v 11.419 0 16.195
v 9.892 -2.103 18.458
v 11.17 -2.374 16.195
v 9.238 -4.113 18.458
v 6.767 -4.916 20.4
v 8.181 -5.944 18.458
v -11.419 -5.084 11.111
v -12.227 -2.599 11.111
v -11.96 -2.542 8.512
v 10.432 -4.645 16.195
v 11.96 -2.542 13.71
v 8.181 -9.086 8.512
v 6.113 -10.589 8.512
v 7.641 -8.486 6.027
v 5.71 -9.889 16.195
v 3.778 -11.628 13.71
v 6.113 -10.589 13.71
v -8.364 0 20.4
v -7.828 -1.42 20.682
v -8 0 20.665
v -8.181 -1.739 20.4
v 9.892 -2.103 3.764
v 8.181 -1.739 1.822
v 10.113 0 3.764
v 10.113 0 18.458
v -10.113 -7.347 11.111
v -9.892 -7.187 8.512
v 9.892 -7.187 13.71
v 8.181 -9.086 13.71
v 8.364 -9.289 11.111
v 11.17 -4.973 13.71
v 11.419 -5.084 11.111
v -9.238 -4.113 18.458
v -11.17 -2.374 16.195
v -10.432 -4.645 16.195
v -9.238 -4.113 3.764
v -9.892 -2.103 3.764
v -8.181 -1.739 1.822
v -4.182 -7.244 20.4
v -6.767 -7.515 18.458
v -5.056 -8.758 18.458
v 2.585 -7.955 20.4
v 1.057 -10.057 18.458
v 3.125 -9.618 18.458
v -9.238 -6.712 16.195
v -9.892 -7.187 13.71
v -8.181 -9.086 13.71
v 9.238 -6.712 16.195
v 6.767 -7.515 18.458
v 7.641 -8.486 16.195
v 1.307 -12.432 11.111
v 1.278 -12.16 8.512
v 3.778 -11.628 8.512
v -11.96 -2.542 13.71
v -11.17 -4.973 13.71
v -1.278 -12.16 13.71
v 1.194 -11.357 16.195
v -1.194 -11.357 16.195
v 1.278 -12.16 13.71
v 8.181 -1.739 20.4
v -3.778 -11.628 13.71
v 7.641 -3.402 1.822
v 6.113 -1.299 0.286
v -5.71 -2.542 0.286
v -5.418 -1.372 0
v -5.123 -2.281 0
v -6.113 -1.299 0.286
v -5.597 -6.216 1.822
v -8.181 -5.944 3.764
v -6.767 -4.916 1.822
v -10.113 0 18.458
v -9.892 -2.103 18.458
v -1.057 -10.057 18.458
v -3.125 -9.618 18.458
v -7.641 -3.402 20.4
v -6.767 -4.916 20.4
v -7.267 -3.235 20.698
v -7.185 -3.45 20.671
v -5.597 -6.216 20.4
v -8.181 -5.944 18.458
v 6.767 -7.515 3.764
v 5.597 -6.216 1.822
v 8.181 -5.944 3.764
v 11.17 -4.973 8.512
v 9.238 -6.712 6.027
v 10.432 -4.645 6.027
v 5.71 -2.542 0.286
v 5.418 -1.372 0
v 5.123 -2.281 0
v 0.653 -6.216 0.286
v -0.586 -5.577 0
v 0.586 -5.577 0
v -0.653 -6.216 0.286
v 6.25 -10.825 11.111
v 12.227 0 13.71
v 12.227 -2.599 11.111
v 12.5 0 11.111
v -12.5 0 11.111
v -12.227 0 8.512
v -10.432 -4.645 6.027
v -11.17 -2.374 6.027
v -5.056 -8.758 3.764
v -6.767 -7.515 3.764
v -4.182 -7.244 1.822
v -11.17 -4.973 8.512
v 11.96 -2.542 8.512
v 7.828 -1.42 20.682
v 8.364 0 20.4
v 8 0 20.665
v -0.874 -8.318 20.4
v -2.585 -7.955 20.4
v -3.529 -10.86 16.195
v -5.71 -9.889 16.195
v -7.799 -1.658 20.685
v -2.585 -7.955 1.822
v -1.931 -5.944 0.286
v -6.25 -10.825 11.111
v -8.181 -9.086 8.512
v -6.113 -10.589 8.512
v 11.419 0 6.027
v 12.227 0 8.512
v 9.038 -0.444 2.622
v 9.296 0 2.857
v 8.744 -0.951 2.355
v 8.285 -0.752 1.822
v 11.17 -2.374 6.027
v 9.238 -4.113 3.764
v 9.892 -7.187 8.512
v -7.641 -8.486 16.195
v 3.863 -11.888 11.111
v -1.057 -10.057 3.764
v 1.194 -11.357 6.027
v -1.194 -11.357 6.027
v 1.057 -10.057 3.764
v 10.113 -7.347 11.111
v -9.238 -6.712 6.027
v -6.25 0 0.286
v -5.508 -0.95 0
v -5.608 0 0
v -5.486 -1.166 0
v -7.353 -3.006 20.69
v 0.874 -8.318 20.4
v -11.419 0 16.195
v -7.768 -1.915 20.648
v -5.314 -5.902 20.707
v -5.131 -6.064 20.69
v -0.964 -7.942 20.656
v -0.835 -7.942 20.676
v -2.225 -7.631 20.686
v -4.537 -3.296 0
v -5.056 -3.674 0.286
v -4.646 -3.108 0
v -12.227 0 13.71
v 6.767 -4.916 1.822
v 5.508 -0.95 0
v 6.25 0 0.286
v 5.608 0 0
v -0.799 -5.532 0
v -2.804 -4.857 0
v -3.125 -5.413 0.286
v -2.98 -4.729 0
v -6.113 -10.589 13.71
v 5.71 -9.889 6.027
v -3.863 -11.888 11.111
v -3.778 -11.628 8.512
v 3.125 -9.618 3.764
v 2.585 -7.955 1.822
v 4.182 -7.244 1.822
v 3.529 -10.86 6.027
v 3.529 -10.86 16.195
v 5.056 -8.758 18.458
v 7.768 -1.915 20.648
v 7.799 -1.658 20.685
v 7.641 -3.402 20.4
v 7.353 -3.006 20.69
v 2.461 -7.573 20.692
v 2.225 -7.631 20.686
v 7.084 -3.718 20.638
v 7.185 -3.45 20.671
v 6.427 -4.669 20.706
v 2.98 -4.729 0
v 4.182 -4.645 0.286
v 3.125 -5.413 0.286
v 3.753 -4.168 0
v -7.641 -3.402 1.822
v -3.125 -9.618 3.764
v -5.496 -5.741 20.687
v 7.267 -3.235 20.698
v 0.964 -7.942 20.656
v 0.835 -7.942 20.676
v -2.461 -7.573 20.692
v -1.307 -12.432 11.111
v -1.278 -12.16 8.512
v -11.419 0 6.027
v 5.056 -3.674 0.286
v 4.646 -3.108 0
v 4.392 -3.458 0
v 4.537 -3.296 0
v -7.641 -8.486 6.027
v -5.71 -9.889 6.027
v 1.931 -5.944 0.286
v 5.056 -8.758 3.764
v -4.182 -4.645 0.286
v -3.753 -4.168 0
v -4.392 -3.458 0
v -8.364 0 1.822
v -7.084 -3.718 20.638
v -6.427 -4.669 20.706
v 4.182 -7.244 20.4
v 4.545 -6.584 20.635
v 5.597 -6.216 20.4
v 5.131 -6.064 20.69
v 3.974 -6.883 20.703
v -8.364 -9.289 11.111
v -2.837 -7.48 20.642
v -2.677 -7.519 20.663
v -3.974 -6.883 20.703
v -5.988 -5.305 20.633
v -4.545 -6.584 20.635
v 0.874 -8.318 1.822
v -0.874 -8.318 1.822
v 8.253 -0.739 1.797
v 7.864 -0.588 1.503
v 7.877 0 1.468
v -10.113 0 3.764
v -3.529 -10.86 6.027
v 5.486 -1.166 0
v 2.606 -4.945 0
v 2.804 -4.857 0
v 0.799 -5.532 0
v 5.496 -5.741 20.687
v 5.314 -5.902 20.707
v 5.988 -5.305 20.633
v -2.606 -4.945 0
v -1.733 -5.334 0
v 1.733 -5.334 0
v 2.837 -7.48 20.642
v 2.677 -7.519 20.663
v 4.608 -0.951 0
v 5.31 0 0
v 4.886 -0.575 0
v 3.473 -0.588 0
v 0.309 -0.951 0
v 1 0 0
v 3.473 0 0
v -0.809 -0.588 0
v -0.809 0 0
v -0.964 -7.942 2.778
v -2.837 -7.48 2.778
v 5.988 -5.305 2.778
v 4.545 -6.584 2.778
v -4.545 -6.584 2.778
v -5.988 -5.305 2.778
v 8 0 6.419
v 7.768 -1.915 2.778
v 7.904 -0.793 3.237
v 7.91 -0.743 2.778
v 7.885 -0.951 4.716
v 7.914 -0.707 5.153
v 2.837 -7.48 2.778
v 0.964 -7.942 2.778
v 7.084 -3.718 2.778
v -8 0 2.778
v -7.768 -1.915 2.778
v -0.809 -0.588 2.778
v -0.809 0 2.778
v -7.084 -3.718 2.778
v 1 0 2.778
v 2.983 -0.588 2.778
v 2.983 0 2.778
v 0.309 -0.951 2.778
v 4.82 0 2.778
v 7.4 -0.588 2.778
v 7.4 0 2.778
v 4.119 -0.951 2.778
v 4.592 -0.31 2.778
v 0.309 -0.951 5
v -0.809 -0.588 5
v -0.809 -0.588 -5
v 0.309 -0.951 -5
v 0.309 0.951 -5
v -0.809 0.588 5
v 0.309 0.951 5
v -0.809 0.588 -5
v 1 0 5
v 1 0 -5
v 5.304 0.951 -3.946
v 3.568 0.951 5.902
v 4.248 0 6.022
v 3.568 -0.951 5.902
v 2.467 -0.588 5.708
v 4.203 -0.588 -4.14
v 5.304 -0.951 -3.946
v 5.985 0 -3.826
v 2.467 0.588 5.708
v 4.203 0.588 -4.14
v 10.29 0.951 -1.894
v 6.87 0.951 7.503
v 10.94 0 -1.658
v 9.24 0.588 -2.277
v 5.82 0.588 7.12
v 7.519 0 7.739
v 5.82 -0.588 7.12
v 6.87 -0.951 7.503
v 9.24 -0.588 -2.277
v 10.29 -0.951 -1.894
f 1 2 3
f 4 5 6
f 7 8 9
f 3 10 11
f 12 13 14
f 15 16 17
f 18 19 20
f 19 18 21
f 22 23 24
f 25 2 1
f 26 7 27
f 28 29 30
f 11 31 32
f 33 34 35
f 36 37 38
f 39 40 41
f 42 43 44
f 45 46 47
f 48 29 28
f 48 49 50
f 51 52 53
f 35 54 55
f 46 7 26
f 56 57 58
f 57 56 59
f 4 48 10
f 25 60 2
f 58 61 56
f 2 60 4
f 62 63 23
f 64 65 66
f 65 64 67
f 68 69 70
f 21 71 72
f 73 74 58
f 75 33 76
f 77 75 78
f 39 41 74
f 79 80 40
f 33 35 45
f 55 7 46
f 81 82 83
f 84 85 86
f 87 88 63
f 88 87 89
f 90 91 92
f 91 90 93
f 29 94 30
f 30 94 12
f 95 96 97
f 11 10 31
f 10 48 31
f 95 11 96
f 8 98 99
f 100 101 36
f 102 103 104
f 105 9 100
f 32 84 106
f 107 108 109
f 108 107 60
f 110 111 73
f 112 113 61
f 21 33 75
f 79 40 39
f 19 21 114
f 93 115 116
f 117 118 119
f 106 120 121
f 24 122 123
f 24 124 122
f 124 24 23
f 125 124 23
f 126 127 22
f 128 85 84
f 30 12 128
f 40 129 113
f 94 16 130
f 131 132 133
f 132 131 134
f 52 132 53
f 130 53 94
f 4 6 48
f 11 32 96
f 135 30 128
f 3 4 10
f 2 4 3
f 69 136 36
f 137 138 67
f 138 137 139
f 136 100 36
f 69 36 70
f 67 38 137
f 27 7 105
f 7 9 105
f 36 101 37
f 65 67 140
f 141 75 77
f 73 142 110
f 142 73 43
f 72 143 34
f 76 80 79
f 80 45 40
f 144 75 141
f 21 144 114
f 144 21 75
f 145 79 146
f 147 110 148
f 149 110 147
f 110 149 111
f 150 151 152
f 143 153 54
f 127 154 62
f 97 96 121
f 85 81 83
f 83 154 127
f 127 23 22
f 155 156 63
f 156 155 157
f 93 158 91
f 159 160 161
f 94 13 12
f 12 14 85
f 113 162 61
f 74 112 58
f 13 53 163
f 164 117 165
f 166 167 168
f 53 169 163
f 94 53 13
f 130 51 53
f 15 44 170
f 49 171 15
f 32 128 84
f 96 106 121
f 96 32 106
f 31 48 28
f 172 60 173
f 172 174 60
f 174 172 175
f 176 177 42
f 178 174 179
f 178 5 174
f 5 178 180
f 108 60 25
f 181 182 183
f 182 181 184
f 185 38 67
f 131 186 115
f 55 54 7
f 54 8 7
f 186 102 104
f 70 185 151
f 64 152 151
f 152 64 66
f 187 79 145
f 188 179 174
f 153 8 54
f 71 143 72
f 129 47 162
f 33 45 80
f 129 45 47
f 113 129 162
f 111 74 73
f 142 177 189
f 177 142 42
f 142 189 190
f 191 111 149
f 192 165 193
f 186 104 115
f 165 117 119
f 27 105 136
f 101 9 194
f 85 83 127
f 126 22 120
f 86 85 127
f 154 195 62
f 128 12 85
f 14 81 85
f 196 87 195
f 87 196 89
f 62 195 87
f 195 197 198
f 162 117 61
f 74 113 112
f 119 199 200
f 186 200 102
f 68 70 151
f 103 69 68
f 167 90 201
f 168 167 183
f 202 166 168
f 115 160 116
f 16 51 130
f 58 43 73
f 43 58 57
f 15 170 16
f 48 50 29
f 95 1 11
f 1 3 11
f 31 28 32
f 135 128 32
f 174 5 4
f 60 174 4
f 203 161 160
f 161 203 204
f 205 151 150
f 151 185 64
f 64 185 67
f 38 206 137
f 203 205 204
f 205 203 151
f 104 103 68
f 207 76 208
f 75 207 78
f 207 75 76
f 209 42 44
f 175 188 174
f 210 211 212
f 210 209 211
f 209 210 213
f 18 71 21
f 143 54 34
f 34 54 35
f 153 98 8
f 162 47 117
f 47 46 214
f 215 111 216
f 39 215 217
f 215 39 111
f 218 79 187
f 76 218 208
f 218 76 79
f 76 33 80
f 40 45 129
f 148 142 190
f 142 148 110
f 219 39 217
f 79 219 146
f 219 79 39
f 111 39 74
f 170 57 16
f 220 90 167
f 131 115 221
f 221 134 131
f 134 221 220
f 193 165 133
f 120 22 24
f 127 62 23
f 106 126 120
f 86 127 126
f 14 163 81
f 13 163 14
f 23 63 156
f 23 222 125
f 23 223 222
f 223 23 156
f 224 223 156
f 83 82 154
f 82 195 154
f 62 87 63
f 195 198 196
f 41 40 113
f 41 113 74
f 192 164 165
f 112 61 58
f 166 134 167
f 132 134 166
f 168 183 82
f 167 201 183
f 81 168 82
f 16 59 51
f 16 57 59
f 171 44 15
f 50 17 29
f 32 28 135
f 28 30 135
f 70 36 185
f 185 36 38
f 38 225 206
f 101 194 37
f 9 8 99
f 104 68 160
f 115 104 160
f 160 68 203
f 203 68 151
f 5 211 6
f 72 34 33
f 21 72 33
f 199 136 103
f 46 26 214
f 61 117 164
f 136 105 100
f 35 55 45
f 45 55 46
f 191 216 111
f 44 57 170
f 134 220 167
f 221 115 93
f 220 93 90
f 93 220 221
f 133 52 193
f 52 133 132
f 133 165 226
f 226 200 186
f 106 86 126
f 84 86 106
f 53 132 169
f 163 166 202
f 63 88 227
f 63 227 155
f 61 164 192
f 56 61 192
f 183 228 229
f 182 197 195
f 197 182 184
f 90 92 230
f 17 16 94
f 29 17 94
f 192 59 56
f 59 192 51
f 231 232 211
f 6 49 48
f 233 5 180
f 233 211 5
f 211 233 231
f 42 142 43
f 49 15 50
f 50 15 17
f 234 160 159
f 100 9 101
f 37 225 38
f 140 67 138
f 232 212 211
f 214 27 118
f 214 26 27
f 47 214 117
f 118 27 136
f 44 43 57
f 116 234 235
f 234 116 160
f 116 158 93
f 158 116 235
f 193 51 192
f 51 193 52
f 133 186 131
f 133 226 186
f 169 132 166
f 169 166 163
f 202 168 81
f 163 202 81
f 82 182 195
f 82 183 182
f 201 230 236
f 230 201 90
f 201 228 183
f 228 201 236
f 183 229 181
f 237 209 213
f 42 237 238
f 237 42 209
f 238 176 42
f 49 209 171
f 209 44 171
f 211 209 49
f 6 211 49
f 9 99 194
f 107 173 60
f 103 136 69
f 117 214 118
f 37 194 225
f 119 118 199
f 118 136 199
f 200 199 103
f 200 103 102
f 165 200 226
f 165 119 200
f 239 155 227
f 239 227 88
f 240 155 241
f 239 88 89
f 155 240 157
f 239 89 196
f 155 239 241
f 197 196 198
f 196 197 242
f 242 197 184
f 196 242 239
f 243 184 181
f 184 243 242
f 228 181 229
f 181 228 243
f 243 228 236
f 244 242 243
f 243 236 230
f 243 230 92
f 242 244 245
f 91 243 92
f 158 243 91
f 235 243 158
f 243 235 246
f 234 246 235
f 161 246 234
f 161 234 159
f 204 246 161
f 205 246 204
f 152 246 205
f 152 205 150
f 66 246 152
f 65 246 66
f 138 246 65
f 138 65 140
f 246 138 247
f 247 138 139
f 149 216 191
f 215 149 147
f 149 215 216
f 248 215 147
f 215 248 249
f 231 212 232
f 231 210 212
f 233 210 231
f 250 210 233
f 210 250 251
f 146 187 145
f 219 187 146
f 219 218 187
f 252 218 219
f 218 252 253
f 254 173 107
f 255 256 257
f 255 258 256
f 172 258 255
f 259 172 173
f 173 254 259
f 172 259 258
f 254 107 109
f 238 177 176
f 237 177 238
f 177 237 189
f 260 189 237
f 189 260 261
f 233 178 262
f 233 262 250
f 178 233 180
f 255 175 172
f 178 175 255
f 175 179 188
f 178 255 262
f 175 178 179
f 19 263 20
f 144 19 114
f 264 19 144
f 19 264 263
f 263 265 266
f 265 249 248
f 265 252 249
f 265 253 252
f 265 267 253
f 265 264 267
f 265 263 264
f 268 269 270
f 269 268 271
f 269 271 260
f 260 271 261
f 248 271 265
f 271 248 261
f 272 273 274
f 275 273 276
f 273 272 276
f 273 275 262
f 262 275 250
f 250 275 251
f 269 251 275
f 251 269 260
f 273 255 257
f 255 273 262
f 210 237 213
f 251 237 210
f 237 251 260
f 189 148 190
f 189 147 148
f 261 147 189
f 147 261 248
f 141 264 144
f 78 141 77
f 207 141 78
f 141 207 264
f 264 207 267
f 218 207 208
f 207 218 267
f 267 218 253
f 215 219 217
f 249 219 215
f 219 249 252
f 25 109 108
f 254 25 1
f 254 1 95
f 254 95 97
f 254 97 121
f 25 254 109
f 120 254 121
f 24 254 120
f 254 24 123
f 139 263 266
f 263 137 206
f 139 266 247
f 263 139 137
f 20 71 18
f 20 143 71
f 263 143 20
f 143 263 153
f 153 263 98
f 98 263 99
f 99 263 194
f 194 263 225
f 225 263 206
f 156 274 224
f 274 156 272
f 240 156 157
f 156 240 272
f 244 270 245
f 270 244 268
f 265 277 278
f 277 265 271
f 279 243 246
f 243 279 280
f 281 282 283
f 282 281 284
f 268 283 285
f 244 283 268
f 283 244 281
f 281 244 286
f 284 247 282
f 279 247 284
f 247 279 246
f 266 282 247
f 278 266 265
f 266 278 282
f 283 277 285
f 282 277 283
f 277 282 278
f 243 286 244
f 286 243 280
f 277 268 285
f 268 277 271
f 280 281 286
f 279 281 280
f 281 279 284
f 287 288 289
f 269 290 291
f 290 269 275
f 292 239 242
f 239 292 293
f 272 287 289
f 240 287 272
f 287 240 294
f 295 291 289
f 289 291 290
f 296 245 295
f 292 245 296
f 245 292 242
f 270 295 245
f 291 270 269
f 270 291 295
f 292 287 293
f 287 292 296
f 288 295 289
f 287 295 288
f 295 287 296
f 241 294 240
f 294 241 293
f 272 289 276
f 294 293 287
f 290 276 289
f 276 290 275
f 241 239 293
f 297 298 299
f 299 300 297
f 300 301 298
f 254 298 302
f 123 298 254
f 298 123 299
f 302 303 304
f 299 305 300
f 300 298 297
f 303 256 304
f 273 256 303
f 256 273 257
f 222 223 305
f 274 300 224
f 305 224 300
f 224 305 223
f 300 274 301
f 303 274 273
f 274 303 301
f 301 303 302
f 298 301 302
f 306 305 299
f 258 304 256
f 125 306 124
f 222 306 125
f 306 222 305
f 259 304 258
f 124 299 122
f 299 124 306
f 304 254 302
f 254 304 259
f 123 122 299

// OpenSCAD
i_d = 16;
o_d = 25;
o_shift = 3;
wall = 1;
height = 20;

difference()
{
    translate([0,0,o_d*4/9])
    sphere(d=o_d);
    
    translate([-o_d/2,-o_d/2,-o_d*1/9])
    cube([o_d,o_d,o_d*1/9]);
   
    translate([0,0,o_d-20-o_d*1/9*0.8])
    cylinder(d=i_d, h=20*1.1);    

    cut();
}

translate([0,0,-5])
rod(0);
translate([5,0,-4])
rod(-10);
translate([10,0,-2])
rod(-20);

module cut()
{
    translate([-25, 0, -20])
    cube([50, 50, 100]);
}

module rod(angle=0)
{
    rotate([0,angle,0])
    cylinder(d=2, h=10);
}
